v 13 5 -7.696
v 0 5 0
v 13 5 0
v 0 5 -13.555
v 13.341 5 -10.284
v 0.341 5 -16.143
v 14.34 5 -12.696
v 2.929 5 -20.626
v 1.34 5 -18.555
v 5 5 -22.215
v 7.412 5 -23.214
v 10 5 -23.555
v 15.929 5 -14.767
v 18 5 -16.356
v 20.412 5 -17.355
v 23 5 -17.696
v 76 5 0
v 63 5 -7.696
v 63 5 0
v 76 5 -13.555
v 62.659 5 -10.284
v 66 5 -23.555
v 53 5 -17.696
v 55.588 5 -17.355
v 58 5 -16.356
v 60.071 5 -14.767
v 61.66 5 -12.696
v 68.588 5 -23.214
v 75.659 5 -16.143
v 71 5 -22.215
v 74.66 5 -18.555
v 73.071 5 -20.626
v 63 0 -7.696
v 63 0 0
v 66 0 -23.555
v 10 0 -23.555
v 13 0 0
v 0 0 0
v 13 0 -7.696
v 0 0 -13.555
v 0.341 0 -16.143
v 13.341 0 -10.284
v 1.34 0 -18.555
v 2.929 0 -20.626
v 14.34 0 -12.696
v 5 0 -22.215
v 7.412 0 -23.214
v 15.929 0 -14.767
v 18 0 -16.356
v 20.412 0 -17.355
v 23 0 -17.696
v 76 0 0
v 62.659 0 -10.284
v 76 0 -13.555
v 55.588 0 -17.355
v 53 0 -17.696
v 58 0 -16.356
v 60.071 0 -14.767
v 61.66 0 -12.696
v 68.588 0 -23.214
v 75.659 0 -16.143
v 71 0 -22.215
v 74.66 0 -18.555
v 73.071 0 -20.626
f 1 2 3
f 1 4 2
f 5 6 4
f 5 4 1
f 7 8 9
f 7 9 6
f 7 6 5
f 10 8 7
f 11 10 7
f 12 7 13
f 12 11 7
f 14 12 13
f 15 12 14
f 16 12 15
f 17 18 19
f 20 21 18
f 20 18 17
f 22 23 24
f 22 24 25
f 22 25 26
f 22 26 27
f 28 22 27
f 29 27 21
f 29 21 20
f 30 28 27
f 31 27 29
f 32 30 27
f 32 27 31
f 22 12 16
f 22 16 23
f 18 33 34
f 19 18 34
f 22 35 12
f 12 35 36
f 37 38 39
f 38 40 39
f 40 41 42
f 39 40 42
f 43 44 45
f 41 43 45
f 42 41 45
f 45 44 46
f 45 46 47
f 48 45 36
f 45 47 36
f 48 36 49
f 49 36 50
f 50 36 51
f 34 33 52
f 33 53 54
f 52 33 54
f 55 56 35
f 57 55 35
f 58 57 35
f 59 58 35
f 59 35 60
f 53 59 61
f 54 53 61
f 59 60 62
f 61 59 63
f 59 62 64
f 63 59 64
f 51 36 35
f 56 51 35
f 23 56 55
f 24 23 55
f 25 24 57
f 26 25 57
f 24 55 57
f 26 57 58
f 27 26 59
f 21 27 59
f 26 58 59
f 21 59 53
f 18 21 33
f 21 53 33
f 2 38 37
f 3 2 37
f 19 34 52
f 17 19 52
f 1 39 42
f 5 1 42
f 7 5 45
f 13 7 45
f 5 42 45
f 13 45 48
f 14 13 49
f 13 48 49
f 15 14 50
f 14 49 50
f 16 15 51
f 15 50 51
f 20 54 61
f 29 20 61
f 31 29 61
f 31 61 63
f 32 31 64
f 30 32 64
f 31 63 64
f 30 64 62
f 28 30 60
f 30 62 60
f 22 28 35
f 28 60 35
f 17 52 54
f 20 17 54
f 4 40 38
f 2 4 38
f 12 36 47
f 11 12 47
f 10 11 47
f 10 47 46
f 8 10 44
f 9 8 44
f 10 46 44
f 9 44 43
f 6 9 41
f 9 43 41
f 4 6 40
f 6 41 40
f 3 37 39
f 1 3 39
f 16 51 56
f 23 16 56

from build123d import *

# Parameters (mm, degrees)
SALIENTE_EXTRUIR2_DEPTH = 5


with BuildPart() as part:
    # Croquis1 → Saliente-Extruir2 (new body)
    with BuildSketch(Plane(origin=(0, 0, 0), x_dir=(1, 0, 0), z_dir=(0, 1, 0))):
        with BuildLine():
            Line((0, 0), (13, 0))
            Line((13, 0), (13, 7.6962052))
            ThreePointArc((13, 7.6962052), (15.928932188, 14.767273012), (23, 17.6962052))
            Line((23, 17.6962052), (53, 17.6962052))
            ThreePointArc((53, 17.6962052), (60.071067812, 14.767273012), (63, 7.6962052))
            Line((63, 7.6962052), (63, 0))
            Line((63, 0), (76, 0))
            Line((76, 0), (76, 13.554999328))
            ThreePointArc((76, 13.554999328), (73.071067812, 20.62606714), (66, 23.554999328))
            Line((66, 23.554999328), (10, 23.554999328))
            ThreePointArc((10, 23.554999328), (2.928932188, 20.62606714), (0, 13.554999328))
            Line((0, 13.554999328), (0, 0))
        make_face()
    extrude(amount=SALIENTE_EXTRUIR2_DEPTH)


solid = part.part
